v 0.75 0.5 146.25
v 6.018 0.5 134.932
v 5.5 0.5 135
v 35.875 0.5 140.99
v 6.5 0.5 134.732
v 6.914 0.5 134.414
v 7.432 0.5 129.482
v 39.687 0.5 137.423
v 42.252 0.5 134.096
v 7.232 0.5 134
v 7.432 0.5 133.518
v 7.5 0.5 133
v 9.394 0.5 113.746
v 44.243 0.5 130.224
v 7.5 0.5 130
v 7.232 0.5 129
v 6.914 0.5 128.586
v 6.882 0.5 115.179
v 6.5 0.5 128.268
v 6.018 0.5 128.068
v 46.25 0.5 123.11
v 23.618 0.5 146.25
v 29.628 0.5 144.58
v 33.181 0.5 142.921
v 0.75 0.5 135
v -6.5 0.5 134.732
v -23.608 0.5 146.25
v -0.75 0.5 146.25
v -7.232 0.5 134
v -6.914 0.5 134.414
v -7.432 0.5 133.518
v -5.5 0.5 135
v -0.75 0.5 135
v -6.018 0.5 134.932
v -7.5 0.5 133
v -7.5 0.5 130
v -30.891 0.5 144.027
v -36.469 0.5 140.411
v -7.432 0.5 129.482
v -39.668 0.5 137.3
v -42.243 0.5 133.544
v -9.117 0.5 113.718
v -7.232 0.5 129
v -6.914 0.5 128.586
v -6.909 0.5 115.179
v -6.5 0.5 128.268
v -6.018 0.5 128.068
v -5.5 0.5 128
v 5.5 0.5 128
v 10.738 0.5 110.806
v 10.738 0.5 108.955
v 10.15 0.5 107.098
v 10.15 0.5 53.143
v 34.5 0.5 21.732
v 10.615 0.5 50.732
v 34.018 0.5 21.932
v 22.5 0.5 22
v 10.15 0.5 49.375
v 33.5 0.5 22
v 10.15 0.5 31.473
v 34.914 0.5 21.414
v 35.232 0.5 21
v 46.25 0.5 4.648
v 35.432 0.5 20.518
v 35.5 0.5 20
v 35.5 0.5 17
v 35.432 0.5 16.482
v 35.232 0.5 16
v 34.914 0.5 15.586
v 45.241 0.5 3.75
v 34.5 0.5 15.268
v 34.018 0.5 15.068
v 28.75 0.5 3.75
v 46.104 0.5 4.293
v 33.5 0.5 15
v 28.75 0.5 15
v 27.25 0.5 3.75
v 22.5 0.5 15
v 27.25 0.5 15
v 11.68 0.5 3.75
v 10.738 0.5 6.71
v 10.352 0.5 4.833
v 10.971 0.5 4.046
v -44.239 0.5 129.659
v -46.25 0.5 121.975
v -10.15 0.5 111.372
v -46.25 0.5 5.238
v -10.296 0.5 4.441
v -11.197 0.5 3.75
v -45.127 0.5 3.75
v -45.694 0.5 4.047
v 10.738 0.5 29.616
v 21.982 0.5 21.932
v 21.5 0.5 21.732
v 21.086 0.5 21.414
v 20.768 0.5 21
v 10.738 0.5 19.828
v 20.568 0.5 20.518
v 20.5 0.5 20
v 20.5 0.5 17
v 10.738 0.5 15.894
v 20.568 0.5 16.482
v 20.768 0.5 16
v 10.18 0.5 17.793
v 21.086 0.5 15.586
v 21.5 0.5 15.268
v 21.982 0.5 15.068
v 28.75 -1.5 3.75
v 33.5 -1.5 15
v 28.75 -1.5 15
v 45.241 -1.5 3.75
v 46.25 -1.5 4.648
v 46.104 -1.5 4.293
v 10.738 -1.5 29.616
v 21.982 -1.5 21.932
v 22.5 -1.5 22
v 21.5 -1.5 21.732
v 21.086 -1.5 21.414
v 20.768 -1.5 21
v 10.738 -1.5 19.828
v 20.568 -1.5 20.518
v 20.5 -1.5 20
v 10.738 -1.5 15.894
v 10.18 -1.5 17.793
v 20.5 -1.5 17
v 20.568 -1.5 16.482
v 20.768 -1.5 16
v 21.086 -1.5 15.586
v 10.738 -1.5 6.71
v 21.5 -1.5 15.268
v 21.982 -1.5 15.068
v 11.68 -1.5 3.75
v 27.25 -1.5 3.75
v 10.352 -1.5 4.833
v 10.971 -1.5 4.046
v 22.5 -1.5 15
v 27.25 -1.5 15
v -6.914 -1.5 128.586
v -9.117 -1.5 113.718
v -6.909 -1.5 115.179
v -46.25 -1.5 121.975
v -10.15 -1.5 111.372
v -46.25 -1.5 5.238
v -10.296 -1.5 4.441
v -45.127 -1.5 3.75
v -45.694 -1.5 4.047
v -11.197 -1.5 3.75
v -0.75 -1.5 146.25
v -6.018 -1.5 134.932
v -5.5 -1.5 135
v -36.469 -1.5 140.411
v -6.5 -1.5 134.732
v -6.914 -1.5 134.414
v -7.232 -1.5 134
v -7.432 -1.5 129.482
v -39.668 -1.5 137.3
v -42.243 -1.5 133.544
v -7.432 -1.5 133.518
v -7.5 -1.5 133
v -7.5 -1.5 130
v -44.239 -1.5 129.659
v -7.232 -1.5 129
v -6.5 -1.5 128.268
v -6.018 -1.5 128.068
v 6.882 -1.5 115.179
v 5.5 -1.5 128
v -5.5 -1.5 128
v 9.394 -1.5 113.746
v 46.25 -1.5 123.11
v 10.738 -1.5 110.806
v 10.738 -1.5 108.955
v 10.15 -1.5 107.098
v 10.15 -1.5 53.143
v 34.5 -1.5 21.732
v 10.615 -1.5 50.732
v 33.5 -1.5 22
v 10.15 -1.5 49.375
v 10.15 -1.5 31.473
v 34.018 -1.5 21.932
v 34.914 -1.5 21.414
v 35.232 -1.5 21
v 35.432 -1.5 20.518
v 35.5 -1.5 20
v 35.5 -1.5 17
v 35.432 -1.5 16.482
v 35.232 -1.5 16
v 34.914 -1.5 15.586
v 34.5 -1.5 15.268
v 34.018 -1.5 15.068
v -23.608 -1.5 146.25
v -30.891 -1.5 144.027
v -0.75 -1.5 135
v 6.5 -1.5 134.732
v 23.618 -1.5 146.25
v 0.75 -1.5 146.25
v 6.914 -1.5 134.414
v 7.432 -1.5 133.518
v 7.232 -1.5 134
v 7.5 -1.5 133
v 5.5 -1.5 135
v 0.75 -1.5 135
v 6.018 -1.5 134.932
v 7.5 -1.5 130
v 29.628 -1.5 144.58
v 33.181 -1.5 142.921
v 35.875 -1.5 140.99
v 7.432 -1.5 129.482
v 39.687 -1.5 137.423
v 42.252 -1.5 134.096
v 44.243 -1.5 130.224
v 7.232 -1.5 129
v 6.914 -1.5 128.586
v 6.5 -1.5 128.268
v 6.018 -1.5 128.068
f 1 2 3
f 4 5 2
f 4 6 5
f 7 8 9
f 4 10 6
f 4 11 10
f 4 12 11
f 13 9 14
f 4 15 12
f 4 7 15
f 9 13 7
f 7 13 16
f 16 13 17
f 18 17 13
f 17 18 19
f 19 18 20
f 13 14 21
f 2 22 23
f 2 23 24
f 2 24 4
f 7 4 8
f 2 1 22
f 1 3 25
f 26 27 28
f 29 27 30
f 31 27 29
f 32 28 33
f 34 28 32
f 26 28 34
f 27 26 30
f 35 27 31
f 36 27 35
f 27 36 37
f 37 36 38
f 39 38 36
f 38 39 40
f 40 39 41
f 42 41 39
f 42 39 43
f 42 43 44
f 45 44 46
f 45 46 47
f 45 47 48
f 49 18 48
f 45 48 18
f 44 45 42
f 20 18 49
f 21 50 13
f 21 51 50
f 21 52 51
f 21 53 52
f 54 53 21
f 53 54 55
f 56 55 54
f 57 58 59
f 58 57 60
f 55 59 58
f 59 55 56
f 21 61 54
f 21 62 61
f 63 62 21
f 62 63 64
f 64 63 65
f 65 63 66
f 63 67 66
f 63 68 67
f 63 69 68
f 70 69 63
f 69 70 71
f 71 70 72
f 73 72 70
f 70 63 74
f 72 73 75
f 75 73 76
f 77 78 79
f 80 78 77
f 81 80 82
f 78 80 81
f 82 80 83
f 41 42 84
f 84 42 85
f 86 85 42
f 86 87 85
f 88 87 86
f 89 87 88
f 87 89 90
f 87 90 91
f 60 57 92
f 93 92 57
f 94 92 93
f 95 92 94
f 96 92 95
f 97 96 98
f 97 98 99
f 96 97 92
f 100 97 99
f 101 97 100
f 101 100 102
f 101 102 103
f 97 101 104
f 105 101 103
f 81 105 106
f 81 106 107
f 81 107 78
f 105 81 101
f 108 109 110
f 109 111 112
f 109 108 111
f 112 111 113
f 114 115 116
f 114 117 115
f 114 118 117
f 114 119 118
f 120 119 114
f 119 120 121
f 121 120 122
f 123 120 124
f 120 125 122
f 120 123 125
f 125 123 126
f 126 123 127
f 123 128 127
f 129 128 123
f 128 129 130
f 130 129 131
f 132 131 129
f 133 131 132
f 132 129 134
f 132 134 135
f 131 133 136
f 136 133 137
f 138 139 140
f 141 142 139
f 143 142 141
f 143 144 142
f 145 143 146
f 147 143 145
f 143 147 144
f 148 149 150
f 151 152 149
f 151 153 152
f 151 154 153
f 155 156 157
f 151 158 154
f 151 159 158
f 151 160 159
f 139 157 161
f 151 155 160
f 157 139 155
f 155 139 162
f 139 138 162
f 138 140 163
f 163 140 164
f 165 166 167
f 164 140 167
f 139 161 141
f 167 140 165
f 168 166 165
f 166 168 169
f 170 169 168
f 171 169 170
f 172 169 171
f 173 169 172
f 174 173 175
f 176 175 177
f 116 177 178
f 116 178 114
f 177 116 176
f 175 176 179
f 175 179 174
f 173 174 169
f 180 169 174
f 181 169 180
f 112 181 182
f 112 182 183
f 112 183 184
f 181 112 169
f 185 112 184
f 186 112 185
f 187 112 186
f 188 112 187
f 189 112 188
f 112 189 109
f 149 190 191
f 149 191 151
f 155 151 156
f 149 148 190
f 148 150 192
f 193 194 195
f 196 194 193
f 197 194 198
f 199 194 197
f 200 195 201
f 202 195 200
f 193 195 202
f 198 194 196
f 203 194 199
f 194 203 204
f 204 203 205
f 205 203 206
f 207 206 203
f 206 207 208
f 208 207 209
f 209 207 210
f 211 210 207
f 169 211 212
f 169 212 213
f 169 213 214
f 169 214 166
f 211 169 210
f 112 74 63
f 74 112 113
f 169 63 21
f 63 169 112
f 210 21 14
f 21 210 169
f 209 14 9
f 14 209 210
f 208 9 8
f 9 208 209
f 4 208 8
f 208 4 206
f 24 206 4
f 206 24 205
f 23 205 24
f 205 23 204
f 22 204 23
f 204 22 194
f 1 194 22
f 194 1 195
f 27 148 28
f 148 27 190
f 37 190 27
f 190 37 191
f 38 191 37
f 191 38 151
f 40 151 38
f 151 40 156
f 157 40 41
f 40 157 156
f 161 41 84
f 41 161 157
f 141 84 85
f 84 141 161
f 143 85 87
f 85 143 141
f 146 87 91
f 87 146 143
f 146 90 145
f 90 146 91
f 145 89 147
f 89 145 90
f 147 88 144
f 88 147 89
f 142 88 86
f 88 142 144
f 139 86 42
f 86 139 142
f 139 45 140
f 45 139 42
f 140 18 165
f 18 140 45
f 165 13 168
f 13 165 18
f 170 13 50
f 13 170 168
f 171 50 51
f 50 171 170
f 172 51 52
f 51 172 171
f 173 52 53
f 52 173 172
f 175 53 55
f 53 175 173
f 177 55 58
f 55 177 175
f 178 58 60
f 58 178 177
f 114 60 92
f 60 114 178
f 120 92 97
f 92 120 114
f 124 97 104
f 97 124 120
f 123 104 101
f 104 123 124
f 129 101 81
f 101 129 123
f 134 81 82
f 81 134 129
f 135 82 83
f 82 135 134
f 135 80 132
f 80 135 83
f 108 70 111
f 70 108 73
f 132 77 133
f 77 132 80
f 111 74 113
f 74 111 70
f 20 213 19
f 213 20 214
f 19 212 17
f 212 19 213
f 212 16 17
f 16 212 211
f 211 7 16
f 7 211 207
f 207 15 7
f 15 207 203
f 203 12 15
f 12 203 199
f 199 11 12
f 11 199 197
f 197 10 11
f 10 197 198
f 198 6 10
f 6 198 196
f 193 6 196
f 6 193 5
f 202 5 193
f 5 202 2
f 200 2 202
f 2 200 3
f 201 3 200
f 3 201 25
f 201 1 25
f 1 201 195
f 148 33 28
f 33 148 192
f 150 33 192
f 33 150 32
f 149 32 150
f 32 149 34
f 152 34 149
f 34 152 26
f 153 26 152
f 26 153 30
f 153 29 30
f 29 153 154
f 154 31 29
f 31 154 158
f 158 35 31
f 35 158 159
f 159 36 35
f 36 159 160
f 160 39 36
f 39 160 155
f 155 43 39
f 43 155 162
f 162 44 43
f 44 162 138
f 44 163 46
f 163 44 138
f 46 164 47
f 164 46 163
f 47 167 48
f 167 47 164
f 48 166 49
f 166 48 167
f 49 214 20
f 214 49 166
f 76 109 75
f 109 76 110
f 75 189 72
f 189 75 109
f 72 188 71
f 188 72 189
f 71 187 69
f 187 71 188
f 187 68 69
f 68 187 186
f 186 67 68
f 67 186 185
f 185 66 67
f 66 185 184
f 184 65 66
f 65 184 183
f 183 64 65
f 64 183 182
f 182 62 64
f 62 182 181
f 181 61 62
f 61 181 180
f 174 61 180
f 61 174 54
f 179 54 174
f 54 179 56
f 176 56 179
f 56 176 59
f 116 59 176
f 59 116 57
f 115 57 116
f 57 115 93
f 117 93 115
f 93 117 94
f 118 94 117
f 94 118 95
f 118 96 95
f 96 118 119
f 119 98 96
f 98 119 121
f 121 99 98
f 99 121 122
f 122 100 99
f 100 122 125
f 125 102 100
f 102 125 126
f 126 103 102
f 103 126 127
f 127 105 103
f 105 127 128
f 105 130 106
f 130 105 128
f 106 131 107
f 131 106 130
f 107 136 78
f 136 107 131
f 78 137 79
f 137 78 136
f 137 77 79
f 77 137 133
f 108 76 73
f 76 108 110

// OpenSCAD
// file: shape_pts.scad
// Letter "n" (#2 & #5, Print 2x) ? Top X=0 Conduit + Right-Leg Bottom X=+28 Conduit
// Vertical-display edition: bottom divider clip removed, interlocking hollow double-dovetail channels added.

shape_w = 94.00;
shape_h = 144.00;

rec_snap_top_x = 15.50;
rec_snap_top_z = 144.00;
rec_snap_bot_x = -28.27;

rec_top_conn_enable   = true;
rec_top_conn_x        = 0.00;
rec_bot_conn_enable   = true;
rec_bot_conn_x        = 28.00;
rec_left_conn_enable  = false;
rec_left_conn_z       = 0.00;
rec_left_conn_face_x  = 0.00;
rec_left_conn_pocket_x = 0.00;
rec_right_conn_enable = false;
rec_right_conn_z      = 0.00;
rec_right_conn_face_x = 0.00;
rec_right_conn_pocket_x = 0.00;

rec_magnet_enable = true;
rec_magnet_x      = -26.00;
rec_magnet_z      = 120.20;

rec_wall_mount_enable = false;
rec_wall_mount_x      = 0.00;
rec_wall_mount_z      = 125.00;

rec_include_controller = false;
rec_chip_x     = -28.00;
rec_chip_z     = 98.50;
rec_cable_x    = -28.00;
rec_ziptie_z   = 73.00;
rec_keyhole_z  = 59.00;
rec_slit_dir   = -1;

rec_pillars = [[-28.0, 30.0], [-28.0, 85.0], [28.0, 85.0], [26.0, 122.0]];
rec_has_face_grooves = false;

shape_pts = [[47.000,120.214],[47.000,1.500],[46.706,0.786],[45.458,0.000],[11.530,0.000],[10.502,0.429],[9.547,1.643],[9.988,3.786],[9.988,12.786],[9.400,14.786],[9.988,16.929],[9.988,26.500],[9.400,28.357],[9.400,46.500],[9.841,47.786],[9.400,50.071],[9.400,104.214],[9.988,106.071],[9.988,107.643],[8.812,110.214],[6.683,111.429],[-6.683,111.429],[-8.519,110.214],[-9.400,108.214],[-9.547,1.071],[-10.942,0.000],[-45.311,0.000],[-46.266,0.500],[-47.000,2.071],[-47.000,119.071],[-44.944,126.929],[-42.888,130.929],[-40.244,134.786],[-36.939,138.000],[-31.211,141.714],[-23.720,144.000],[23.720,144.000],[29.889,142.286],[33.561,140.571],[36.352,138.571],[40.244,134.929],[42.888,131.500],[44.944,127.500]];
shape_paths = [[0, 1, 2, 3, 4, 5, 6, 7, 8, 9, 10, 11, 12, 13, 14, 15, 16, 17, 18, 19, 20, 21, 22, 23, 24, 25, 26, 27, 28, 29, 30, 31, 32, 33, 34, 35, 36, 37, 38, 39, 40, 41, 42]];

diffuser_shape_pts = [[47.000,119.643],[47.000,1.500],[46.706,0.786],[45.458,0.000],[11.530,0.000],[10.134,1.071],[9.988,17.929],[9.400,19.786],[9.400,21.357],[9.988,23.214],[9.988,37.929],[9.400,39.786],[9.400,49.929],[9.988,51.786],[9.400,55.643],[9.400,67.643],[9.988,69.643],[9.400,71.786],[9.988,74.643],[9.988,80.214],[9.400,82.071],[9.547,86.500],[9.988,87.786],[9.988,107.643],[9.106,110.071],[8.005,111.000],[6.683,111.429],[-6.683,111.429],[-8.372,110.357],[-9.400,107.643],[-9.547,1.071],[-10.942,0.000],[-44.870,0.000],[-46.339,0.857],[-47.000,2.071],[-47.000,115.643],[-46.413,117.500],[-46.413,119.643],[-45.091,124.357],[-42.300,130.357],[-40.831,132.500],[-35.764,137.571],[-32.386,140.000],[-26.364,142.857],[-21.958,144.000],[-8.005,144.000],[-6.977,143.714],[-3.231,140.500],[-0.881,135.071],[0.073,134.429],[1.469,135.071],[2.056,137.214],[4.553,141.500],[7.564,143.714],[8.592,144.000],[21.958,144.000],[26.952,142.857],[31.798,140.857],[38.702,135.857],[42.888,130.357],[45.531,125.214]];
diffuser_shape_paths = [[0, 1, 2, 3, 4, 5, 6, 7, 8, 9, 10, 11, 12, 13, 14, 15, 16, 17, 18, 19, 20, 21, 22, 23, 24, 25, 26, 27, 28, 29, 30, 31, 32, 33, 34, 35, 36, 37, 38, 39, 40, 41, 42, 43, 44, 45, 46, 47, 48, 49, 50, 51, 52, 53, 54, 55, 56, 57, 58, 59, 60]];

module shape_2d(pts = shape_pts) {
    polygon(points = pts, paths = shape_paths);
}

module diffuser_shape_2d(pts = diffuser_shape_pts) {
    polygon(points = pts, paths = diffuser_shape_paths);
}

module diffuser_face_grooves_2d() {}
// main file
// Letter "n" (#2 & #5, Print 2x) ? Top X=0 Conduit + Right-Leg Bottom X=+28 Conduit ? internal white reflector plate (2.00 mm thick, aligned LED-strip conduit pockets + entry slits)
// Opens and exports standalone in OpenSCAD / OpenSCAD.js.

use <lamp_core.scad>

render_lamp_part("reflector");
